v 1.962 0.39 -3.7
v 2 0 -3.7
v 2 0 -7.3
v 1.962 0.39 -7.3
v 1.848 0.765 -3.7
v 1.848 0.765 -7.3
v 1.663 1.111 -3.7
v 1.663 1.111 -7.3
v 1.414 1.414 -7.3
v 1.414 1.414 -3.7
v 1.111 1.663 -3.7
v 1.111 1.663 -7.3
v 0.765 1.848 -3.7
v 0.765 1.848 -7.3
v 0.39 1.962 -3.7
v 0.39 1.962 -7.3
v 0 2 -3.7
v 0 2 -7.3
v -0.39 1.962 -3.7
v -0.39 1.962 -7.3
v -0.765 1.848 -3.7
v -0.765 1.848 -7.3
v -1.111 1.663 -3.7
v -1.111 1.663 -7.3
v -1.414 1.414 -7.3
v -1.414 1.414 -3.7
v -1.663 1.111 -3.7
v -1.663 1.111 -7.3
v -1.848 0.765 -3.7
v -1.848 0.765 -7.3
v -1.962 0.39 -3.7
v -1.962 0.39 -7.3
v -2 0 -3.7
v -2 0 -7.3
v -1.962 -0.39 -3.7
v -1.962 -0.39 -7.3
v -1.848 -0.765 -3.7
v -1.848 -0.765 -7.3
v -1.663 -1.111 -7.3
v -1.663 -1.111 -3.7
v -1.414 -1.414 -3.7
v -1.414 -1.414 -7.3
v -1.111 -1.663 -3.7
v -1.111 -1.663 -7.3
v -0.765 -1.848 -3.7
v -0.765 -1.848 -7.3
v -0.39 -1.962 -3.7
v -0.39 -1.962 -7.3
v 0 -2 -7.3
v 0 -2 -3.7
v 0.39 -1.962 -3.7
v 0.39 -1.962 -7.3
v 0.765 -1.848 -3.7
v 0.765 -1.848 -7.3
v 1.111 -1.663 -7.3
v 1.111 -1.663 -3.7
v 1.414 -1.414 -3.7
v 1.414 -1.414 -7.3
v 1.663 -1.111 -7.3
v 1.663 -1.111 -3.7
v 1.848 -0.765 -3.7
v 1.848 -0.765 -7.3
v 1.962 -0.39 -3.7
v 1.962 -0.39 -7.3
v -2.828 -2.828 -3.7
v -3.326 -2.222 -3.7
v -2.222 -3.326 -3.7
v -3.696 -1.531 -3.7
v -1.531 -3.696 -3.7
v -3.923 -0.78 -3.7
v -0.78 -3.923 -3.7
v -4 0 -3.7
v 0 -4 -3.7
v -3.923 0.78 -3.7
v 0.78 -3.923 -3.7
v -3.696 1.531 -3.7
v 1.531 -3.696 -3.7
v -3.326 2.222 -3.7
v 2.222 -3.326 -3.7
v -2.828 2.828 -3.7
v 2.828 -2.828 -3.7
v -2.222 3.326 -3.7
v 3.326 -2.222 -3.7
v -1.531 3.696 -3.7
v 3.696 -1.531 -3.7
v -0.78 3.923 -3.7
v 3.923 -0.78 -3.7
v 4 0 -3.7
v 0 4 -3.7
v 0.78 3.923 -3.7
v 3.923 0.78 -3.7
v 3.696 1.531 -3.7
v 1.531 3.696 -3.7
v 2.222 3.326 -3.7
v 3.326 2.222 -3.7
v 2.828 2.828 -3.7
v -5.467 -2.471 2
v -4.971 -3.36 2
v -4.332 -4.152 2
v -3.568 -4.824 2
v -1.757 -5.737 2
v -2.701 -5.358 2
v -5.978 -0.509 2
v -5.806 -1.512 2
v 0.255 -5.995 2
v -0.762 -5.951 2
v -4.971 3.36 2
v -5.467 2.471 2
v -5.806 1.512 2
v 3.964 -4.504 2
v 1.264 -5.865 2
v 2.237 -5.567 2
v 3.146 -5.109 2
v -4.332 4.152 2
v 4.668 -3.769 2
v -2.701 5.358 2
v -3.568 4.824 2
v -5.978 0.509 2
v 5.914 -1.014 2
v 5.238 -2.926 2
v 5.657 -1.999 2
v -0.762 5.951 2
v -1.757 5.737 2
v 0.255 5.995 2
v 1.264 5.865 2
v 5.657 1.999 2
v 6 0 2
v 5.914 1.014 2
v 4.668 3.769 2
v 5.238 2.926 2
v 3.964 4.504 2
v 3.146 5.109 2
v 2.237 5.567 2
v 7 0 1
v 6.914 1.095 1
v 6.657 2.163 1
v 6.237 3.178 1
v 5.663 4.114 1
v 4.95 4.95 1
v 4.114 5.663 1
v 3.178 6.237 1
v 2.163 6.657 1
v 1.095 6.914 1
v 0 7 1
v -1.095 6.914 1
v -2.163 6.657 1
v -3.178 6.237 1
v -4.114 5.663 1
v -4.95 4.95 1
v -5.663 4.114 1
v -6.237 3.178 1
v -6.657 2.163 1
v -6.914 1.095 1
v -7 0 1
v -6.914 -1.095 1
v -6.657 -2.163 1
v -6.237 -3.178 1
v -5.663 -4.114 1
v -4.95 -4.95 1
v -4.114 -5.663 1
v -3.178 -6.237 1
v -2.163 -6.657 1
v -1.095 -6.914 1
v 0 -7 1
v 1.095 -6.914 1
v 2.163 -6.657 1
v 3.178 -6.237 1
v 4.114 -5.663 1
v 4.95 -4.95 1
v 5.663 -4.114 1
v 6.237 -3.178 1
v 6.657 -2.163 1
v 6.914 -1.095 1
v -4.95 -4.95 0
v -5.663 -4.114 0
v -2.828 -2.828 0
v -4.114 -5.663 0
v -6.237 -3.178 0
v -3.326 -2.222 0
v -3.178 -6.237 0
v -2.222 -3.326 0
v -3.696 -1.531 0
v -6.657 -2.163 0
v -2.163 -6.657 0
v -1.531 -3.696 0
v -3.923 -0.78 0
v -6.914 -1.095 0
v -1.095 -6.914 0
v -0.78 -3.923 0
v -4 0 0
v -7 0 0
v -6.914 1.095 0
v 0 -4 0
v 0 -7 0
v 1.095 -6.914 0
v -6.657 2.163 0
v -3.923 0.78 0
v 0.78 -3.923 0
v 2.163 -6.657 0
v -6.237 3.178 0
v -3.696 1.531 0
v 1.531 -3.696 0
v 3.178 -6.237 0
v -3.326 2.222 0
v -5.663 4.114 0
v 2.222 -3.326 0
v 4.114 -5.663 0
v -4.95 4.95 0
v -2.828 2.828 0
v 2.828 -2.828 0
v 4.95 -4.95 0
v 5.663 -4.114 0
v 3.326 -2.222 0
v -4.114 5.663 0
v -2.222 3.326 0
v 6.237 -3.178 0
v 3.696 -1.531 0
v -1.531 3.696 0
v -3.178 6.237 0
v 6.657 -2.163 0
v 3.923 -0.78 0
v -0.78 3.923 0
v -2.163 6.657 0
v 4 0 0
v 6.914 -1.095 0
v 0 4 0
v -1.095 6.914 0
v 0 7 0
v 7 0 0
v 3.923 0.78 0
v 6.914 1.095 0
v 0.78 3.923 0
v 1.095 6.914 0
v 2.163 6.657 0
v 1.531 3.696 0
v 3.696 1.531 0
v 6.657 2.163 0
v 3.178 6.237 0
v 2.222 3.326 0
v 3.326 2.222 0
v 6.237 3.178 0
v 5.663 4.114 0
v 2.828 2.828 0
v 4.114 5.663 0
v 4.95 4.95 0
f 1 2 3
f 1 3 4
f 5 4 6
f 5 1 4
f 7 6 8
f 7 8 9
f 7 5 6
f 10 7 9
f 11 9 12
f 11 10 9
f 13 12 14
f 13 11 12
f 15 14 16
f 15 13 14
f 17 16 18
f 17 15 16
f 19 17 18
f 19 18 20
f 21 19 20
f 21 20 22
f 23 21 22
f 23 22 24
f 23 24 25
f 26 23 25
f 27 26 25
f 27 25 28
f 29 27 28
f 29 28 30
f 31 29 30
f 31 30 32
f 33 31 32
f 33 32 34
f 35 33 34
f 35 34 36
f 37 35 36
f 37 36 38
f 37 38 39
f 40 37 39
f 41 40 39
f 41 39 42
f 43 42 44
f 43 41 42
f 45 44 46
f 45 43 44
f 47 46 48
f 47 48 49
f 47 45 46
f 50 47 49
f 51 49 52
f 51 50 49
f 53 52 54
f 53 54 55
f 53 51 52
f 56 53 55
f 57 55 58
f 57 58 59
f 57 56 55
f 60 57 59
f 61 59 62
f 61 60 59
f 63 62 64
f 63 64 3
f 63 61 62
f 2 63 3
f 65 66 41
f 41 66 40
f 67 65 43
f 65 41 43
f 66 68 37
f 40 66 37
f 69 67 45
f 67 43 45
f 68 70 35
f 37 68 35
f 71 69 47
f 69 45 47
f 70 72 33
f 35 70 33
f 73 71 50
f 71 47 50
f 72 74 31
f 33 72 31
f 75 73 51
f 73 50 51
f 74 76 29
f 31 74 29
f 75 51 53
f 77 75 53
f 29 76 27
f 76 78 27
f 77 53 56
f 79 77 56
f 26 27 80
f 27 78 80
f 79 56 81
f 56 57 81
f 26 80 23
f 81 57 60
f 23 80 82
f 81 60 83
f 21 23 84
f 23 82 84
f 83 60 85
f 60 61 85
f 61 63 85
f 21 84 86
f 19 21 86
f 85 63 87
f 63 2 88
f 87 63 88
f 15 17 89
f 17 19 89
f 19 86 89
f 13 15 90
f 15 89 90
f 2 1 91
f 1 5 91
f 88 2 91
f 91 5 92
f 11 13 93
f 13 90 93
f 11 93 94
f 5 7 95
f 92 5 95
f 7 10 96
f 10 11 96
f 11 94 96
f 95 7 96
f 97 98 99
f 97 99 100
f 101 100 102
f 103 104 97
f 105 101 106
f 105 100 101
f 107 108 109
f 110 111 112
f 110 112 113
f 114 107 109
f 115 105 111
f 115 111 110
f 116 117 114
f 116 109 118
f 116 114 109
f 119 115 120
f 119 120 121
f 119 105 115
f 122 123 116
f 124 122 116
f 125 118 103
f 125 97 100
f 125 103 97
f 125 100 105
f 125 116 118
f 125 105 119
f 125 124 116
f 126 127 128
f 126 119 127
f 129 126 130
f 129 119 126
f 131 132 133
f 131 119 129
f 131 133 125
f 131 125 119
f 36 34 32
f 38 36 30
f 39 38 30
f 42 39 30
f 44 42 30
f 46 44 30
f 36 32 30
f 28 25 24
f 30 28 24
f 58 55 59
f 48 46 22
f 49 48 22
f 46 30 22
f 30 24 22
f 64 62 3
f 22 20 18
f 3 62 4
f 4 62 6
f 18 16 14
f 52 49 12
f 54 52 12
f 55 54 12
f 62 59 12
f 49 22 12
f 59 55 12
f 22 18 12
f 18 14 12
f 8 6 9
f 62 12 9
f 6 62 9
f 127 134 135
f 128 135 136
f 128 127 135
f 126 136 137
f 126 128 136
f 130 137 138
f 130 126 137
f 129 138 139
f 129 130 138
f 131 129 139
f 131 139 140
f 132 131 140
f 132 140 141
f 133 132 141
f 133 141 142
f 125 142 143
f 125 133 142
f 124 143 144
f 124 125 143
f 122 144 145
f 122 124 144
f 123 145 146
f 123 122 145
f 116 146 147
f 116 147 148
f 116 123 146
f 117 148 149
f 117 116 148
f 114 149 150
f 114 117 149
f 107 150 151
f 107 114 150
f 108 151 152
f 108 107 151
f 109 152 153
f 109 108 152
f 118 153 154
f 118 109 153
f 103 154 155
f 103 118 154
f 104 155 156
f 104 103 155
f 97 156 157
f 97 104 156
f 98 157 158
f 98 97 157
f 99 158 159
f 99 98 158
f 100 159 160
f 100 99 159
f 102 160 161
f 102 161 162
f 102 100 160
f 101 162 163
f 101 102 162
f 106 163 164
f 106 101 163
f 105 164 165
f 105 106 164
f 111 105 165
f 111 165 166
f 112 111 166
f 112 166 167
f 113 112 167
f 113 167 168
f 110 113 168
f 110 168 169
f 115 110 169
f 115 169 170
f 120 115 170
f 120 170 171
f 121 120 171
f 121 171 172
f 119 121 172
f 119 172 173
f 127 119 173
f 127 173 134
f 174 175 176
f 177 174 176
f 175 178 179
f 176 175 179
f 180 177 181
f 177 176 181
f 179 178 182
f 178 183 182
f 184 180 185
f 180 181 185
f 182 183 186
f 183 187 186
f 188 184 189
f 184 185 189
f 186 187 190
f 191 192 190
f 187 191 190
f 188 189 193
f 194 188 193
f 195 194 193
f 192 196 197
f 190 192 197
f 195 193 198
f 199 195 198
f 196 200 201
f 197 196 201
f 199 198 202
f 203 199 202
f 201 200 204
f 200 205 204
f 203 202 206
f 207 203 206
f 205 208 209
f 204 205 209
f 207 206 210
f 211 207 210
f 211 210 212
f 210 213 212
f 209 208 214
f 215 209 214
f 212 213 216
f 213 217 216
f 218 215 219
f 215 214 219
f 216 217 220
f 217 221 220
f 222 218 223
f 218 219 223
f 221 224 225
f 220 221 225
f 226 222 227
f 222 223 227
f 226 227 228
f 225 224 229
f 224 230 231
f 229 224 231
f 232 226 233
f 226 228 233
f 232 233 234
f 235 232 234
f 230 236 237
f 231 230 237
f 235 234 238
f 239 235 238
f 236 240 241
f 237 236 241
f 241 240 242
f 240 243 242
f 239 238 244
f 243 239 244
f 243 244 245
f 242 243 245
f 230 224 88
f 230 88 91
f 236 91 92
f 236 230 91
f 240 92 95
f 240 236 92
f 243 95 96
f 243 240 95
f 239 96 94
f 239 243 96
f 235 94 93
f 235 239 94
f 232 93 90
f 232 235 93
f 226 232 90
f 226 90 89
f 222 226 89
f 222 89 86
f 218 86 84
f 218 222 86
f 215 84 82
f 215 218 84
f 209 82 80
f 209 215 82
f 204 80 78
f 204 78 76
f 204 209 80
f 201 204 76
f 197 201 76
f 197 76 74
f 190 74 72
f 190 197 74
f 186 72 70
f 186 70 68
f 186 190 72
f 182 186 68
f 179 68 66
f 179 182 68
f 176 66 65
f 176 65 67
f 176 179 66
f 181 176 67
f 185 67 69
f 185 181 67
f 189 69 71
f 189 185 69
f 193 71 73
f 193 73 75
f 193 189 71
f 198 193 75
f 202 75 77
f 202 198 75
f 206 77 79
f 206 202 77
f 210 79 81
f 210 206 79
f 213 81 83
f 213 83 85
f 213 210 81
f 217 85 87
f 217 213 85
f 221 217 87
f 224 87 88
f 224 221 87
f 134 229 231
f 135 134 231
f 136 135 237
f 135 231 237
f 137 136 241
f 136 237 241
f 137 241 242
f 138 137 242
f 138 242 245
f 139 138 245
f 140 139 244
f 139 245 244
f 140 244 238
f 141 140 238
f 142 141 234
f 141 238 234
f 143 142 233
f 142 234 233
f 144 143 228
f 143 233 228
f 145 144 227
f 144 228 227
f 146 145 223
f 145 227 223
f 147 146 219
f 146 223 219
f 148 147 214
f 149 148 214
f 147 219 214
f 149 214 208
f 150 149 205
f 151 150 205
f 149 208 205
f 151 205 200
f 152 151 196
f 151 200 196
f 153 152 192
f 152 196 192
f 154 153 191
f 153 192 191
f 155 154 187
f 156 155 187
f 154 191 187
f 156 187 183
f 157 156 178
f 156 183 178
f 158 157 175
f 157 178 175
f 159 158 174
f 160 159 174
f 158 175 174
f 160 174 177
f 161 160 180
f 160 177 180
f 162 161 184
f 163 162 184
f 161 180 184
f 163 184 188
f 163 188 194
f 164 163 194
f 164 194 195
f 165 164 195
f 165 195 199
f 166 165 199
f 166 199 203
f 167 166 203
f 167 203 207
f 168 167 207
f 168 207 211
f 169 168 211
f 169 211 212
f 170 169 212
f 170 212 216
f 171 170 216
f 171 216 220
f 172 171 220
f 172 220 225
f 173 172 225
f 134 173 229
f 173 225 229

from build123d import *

# Parameters (mm, degrees)
F0_R     = 7
F0_R_2   = 4
F0_R_3   = 2
F1_DEPTH = 2
F2_SIZE  = 1
F3_DEPTH = 7.3
F4_DEPTH = 3.7


with BuildPart() as f1:
    # F0 (on Top) → F1 (new body)
    with BuildSketch(Plane.XY):
        Circle(F0_R)
        Circle(F0_R_2, mode=Mode.SUBTRACT)
        Circle(F0_R_2)
        Circle(F0_R_3, mode=Mode.SUBTRACT)
        Circle(F0_R_3)
    extrude(amount=F1_DEPTH)

    # F2
    f2_edges = [f1.edges().sort_by_distance(p)[0] for p in [
        (-7, 0, 2),
    ]]
    chamfer(f2_edges, length=F2_SIZE)

    # F0 (on Top) → F3 (join)
    with BuildSketch(Plane.XY):
        Circle(F0_R_3)
    extrude(amount=-F3_DEPTH)

    # F0 (on Top) → F4 (join)
    with BuildSketch(Plane.XY):
        Circle(F0_R_2)
        Circle(F0_R_3, mode=Mode.SUBTRACT)
    extrude(amount=-F4_DEPTH)


solid = f1.part
